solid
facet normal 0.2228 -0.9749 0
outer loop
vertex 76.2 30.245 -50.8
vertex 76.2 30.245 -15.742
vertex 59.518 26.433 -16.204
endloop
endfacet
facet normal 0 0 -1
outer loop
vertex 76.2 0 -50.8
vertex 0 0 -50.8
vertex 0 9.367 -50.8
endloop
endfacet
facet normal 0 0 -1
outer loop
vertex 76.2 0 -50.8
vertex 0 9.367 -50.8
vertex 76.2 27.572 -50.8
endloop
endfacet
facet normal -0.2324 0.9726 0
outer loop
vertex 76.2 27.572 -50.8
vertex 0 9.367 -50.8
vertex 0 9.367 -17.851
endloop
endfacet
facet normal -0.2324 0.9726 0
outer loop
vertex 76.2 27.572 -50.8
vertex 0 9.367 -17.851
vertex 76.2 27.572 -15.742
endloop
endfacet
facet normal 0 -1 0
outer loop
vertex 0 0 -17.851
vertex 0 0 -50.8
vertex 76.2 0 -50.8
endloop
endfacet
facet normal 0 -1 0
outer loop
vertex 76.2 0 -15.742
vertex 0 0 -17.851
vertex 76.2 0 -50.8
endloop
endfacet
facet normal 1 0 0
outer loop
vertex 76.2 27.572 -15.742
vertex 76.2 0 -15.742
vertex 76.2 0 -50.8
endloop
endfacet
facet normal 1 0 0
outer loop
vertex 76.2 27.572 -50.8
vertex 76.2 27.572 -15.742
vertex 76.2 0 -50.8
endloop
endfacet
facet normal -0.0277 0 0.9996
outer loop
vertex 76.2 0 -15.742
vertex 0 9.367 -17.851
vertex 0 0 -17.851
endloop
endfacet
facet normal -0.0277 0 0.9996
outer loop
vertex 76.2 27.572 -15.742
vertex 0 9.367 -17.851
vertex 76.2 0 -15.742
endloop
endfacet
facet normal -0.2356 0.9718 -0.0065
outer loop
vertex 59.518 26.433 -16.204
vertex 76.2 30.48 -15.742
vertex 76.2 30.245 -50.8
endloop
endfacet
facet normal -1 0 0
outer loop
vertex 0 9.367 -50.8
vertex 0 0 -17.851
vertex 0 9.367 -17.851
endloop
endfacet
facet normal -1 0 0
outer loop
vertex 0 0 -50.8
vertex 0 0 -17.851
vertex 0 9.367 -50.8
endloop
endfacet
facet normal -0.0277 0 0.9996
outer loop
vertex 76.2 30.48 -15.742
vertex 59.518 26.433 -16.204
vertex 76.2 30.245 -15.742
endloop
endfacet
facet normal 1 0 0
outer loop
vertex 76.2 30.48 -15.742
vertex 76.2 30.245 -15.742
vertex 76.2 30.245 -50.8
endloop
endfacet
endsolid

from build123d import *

# Parameters (mm, degrees)
SKETCH1_W           = 76.2
SKETCH1_H           = 50.8
BOSS_EXTRUDE1_DEPTH = 30.48
CUT_EXTRUDE2_DEPTH  = 97.52
CUT_EXTRUDE3_DEPTH  = 89.016960895
CUT_EXTRUDE7_DEPTH  = 90.244060456


with BuildPart() as part:
    # Sketch1 → Boss-Extrude1 (new body)
    with BuildSketch(Plane(origin=(0, 0, 0), x_dir=(1, 0, 0), z_dir=(0, 1, 0))):
        with Locations((38.1, 25.4)):
            Rectangle(SKETCH1_W, SKETCH1_H)
    extrude(amount=BOSS_EXTRUDE1_DEPTH)

    # Sketch3 → Cut-Extrude2 (cut, through all)
    with BuildSketch(Plane(origin=(0, 30.48, 0), x_dir=(1, 0, 0), z_dir=(0, 1, 0))):
        Polygon((0, 17.851416171), (76.2, 15.742448363), (76.2, 0), (0, 0), align=None)
    extrude(amount=-CUT_EXTRUDE2_DEPTH, mode=Mode.SUBTRACT)

    # Sketch4 → Cut-Extrude3 (cut, through all)
    with BuildSketch(Plane(origin=(0.493690887, 0, -17.837752416), x_dir=(0.9996172188458896, 0, 0.02766614875274357), z_dir=(-0.027666148752743574, 0, 0.9996172188458897))):
        Polygon((75.735299158, 30.48), (-0.493879935, 11.992043419), (-0.493879935, 30.48), align=None)
    extrude(amount=-CUT_EXTRUDE3_DEPTH, mode=Mode.SUBTRACT)

    # Sketch6 → Cut-Extrude7 (cut, through all)
    with BuildSketch(Plane(origin=(0, 0, -50.8), x_dir=(-1, 0, 0), z_dir=(0, 0, -1))):
        Polygon((0, 9.36706147), (-76.2, 27.57232113), (-76.2, 30.244767156), (-0.911909483, 13.03971689), (-0.911909483, 32.31211919), (0, 32.31211919), align=None)
    extrude(amount=-CUT_EXTRUDE7_DEPTH, mode=Mode.SUBTRACT)


with BuildPart() as cut_extrude7_piece_1:
    # of the separate pieces the step leaves, piece 1, a body of its own (cut_extrude7_pieces)
    add(part.part.solids().sort_by_distance((0, 0, -50.8))[0])


with BuildPart() as cut_extrude7_piece_2:
    # of the separate pieces the step leaves, piece 2, a body of its own (cut_extrude7_pieces)
    add(part.part.solids().sort_by_distance((76.2, 30.48, -15.742448363))[0])


solid = Compound([cut_extrude7_piece_1.part, cut_extrude7_piece_2.part])
